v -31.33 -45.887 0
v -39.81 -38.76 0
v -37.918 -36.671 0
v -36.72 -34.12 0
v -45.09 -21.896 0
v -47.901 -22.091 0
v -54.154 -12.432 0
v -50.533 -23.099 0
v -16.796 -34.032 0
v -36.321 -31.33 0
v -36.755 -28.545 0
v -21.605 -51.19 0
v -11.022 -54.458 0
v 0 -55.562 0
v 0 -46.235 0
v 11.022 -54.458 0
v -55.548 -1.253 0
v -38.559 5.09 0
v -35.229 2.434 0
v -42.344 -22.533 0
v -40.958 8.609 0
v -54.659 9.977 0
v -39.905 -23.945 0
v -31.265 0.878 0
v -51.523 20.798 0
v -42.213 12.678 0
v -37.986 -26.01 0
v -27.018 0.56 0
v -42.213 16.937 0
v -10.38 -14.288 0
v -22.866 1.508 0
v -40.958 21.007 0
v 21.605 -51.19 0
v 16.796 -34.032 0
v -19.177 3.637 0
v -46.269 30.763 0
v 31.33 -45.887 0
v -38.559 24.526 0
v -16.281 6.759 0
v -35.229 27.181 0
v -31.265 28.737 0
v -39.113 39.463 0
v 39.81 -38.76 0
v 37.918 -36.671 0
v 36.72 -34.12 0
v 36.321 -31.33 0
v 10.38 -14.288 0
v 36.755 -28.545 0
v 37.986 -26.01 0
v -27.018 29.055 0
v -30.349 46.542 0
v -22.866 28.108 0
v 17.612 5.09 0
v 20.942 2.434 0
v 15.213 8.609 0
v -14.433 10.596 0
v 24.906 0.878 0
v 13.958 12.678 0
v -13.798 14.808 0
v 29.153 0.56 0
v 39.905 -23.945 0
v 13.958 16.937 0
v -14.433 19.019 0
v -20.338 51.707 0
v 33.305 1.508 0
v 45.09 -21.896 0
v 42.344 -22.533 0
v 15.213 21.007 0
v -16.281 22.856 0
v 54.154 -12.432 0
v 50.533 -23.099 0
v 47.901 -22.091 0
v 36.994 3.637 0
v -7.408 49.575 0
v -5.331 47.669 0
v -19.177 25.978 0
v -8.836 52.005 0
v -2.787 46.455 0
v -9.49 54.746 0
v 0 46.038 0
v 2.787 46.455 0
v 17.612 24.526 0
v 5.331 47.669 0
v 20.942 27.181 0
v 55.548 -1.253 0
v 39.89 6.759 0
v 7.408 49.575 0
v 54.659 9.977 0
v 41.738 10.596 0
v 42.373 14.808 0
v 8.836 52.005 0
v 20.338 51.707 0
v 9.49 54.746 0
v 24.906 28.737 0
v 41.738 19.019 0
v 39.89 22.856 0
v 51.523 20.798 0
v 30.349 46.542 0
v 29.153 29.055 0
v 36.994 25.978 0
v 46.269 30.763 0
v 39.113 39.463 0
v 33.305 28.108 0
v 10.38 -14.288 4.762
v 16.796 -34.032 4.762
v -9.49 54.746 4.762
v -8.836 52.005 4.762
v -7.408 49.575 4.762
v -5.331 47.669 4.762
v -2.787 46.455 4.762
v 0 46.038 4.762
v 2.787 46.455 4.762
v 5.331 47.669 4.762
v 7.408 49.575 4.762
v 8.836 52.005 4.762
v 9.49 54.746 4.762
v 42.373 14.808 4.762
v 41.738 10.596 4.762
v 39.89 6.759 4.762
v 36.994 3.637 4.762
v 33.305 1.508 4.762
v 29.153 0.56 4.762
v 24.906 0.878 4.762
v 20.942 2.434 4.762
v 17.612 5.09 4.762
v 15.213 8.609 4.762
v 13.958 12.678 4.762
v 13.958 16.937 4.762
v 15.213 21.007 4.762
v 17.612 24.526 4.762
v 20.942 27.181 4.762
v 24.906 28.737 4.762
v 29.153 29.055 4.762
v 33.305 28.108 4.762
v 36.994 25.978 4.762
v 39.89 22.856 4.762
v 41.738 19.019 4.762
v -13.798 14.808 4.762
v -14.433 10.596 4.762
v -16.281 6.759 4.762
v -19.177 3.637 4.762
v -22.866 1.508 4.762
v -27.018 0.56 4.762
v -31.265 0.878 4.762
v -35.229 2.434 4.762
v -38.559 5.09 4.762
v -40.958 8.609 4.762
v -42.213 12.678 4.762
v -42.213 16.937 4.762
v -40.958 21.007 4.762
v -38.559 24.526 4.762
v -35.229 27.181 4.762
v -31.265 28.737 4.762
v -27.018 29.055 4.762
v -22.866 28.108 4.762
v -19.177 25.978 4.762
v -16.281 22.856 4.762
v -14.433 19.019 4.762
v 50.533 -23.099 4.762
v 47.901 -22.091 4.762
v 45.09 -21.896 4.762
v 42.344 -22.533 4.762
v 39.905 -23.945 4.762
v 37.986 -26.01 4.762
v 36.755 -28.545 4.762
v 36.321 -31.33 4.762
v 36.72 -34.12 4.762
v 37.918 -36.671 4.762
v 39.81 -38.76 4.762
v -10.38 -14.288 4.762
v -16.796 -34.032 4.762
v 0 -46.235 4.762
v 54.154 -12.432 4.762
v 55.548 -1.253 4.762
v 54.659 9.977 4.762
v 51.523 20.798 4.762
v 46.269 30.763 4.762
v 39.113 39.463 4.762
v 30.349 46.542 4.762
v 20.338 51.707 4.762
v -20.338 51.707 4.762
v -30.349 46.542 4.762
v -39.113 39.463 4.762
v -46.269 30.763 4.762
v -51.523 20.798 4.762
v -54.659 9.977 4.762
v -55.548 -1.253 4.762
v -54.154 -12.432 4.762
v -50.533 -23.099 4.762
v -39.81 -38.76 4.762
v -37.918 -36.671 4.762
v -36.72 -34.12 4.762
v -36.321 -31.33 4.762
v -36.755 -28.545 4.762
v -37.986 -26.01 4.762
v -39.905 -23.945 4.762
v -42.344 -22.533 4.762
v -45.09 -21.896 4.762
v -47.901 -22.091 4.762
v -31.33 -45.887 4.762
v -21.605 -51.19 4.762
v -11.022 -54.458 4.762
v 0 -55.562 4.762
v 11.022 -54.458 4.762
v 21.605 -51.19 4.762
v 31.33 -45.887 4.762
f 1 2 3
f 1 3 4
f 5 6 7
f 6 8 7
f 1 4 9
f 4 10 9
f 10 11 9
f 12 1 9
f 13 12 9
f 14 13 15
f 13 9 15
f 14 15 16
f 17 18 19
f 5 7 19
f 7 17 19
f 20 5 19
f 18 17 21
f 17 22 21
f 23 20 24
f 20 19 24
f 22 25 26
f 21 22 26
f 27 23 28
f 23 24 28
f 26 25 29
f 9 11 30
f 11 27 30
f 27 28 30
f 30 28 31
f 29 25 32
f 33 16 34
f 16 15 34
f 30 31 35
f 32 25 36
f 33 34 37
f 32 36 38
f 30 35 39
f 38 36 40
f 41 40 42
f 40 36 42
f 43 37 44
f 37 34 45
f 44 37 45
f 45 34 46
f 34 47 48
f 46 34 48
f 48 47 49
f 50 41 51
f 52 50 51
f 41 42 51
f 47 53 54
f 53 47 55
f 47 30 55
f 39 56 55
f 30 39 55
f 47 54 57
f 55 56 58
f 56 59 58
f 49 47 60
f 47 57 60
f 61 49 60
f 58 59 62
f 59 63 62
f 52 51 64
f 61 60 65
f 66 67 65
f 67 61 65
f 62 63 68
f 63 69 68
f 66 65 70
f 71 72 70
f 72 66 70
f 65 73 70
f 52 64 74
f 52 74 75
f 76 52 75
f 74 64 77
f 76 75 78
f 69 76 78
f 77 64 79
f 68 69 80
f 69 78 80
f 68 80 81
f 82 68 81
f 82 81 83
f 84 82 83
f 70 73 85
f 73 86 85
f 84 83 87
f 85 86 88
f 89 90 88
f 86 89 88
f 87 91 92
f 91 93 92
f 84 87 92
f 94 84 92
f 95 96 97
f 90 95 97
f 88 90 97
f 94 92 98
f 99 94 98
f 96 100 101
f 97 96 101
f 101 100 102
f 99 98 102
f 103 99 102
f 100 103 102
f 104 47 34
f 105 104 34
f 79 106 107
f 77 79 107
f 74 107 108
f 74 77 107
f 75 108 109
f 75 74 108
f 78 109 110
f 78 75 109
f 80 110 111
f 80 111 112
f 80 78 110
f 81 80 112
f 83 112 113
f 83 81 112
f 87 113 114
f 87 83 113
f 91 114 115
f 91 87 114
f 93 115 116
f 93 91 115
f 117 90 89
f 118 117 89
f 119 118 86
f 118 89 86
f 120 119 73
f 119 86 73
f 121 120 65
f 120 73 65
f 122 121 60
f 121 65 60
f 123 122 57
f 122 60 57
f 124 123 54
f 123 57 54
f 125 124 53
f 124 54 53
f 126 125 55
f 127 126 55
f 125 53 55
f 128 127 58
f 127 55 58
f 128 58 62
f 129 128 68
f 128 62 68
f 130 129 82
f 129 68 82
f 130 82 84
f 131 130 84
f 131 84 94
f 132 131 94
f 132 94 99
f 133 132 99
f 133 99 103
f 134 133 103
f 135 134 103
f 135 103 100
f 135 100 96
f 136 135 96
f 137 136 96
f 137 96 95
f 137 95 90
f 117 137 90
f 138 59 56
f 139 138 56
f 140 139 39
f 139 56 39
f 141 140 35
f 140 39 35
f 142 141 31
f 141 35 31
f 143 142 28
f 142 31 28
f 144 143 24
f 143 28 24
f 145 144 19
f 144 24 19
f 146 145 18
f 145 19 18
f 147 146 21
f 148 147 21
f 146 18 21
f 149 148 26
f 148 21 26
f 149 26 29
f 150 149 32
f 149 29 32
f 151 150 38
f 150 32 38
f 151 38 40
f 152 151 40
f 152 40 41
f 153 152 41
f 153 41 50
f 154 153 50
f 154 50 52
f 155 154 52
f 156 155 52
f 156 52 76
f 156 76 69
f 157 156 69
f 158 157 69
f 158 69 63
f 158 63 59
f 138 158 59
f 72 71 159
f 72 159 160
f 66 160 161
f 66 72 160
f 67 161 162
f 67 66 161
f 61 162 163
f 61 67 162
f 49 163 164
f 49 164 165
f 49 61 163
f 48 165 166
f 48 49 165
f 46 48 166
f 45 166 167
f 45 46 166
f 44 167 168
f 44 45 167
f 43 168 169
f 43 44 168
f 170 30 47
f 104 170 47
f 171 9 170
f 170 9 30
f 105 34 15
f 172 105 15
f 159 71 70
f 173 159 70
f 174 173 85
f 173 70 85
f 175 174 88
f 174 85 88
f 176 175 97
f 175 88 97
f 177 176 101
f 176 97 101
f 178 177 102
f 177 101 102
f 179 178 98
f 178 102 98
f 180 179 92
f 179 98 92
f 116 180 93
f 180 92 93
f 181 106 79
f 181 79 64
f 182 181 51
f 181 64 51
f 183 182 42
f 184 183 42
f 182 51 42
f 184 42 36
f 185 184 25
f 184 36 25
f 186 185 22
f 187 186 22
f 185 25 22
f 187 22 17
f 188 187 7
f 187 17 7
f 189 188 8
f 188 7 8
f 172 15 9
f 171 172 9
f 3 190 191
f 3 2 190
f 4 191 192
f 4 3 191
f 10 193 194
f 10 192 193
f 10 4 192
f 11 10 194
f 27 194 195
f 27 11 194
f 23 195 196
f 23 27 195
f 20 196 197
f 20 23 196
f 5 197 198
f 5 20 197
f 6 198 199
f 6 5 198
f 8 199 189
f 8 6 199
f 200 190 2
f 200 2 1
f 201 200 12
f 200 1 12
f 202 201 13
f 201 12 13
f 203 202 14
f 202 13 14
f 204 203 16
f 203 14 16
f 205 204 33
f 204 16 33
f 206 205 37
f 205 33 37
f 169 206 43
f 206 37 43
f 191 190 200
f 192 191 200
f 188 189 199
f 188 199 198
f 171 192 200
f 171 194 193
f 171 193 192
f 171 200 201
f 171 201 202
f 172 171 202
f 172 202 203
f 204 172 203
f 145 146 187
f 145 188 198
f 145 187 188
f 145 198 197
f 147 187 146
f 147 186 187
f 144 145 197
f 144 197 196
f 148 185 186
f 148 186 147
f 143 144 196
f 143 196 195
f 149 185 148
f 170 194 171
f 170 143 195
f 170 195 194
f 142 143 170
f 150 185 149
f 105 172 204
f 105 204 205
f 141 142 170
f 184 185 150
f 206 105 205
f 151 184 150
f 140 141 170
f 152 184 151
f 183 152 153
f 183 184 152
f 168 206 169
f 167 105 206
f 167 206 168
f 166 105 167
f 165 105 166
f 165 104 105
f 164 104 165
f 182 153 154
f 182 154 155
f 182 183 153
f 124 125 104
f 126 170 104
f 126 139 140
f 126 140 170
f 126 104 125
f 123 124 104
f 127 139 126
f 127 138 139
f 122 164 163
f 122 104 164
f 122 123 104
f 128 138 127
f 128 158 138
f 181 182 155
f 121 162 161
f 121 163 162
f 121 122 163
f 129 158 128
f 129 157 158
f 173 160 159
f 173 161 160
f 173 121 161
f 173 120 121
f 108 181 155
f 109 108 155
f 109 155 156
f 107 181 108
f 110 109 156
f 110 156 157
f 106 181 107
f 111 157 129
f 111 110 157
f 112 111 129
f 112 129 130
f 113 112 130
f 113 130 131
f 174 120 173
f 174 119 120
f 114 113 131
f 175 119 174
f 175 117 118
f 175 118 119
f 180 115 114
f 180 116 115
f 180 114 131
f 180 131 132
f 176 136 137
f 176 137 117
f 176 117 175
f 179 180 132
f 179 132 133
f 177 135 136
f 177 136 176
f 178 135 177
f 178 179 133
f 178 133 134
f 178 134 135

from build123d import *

# Parameters (mm, degrees)
F0_R     = 55.5625
F2_DEPTH = 4.7625
F1_R     = 9.525
F3_DEPTH = 4.7625
F5_R     = 14.2875
F6_DEPTH = 25.4


with BuildPart() as f2:
    # F0 (on Top) → F2 (new body)
    with BuildSketch(Plane.XY):
        Circle(F0_R)
    extrude(amount=F2_DEPTH)

    # F1 (on Top) → F3 (cut, through all)
    with BuildSketch(Plane.XY):
        with Locations((-45.8453687481, -31.3909791278)):
            Circle(F1_R)
        with Locations((0, 55.5625)):
            Circle(F1_R)
        with Locations((45.8453687481, -31.3909791278)):
            Circle(F1_R)
    extrude(amount=F3_DEPTH, mode=Mode.SUBTRACT)

    # F5 (on face) → F6 (cut)
    with BuildSketch(Plane(origin=(0, 0, 0), x_dir=(1, 0, 0), z_dir=(0, 0, -1))):
        with Locations((-28.0854459631, -14.8077758308)):
            Circle(F5_R)
        with Locations((28.0854459631, -14.8077758308)):
            Circle(F5_R)
        Polygon((16.7959635843, 34.0323393857), (0, 46.2353212285), (-16.7959635843, 34.0323393857), (-10.3804763689, 14.2875), (10.3804763689, 14.2875), align=None)
    extrude(amount=-F6_DEPTH, mode=Mode.SUBTRACT)


solid = f2.part
